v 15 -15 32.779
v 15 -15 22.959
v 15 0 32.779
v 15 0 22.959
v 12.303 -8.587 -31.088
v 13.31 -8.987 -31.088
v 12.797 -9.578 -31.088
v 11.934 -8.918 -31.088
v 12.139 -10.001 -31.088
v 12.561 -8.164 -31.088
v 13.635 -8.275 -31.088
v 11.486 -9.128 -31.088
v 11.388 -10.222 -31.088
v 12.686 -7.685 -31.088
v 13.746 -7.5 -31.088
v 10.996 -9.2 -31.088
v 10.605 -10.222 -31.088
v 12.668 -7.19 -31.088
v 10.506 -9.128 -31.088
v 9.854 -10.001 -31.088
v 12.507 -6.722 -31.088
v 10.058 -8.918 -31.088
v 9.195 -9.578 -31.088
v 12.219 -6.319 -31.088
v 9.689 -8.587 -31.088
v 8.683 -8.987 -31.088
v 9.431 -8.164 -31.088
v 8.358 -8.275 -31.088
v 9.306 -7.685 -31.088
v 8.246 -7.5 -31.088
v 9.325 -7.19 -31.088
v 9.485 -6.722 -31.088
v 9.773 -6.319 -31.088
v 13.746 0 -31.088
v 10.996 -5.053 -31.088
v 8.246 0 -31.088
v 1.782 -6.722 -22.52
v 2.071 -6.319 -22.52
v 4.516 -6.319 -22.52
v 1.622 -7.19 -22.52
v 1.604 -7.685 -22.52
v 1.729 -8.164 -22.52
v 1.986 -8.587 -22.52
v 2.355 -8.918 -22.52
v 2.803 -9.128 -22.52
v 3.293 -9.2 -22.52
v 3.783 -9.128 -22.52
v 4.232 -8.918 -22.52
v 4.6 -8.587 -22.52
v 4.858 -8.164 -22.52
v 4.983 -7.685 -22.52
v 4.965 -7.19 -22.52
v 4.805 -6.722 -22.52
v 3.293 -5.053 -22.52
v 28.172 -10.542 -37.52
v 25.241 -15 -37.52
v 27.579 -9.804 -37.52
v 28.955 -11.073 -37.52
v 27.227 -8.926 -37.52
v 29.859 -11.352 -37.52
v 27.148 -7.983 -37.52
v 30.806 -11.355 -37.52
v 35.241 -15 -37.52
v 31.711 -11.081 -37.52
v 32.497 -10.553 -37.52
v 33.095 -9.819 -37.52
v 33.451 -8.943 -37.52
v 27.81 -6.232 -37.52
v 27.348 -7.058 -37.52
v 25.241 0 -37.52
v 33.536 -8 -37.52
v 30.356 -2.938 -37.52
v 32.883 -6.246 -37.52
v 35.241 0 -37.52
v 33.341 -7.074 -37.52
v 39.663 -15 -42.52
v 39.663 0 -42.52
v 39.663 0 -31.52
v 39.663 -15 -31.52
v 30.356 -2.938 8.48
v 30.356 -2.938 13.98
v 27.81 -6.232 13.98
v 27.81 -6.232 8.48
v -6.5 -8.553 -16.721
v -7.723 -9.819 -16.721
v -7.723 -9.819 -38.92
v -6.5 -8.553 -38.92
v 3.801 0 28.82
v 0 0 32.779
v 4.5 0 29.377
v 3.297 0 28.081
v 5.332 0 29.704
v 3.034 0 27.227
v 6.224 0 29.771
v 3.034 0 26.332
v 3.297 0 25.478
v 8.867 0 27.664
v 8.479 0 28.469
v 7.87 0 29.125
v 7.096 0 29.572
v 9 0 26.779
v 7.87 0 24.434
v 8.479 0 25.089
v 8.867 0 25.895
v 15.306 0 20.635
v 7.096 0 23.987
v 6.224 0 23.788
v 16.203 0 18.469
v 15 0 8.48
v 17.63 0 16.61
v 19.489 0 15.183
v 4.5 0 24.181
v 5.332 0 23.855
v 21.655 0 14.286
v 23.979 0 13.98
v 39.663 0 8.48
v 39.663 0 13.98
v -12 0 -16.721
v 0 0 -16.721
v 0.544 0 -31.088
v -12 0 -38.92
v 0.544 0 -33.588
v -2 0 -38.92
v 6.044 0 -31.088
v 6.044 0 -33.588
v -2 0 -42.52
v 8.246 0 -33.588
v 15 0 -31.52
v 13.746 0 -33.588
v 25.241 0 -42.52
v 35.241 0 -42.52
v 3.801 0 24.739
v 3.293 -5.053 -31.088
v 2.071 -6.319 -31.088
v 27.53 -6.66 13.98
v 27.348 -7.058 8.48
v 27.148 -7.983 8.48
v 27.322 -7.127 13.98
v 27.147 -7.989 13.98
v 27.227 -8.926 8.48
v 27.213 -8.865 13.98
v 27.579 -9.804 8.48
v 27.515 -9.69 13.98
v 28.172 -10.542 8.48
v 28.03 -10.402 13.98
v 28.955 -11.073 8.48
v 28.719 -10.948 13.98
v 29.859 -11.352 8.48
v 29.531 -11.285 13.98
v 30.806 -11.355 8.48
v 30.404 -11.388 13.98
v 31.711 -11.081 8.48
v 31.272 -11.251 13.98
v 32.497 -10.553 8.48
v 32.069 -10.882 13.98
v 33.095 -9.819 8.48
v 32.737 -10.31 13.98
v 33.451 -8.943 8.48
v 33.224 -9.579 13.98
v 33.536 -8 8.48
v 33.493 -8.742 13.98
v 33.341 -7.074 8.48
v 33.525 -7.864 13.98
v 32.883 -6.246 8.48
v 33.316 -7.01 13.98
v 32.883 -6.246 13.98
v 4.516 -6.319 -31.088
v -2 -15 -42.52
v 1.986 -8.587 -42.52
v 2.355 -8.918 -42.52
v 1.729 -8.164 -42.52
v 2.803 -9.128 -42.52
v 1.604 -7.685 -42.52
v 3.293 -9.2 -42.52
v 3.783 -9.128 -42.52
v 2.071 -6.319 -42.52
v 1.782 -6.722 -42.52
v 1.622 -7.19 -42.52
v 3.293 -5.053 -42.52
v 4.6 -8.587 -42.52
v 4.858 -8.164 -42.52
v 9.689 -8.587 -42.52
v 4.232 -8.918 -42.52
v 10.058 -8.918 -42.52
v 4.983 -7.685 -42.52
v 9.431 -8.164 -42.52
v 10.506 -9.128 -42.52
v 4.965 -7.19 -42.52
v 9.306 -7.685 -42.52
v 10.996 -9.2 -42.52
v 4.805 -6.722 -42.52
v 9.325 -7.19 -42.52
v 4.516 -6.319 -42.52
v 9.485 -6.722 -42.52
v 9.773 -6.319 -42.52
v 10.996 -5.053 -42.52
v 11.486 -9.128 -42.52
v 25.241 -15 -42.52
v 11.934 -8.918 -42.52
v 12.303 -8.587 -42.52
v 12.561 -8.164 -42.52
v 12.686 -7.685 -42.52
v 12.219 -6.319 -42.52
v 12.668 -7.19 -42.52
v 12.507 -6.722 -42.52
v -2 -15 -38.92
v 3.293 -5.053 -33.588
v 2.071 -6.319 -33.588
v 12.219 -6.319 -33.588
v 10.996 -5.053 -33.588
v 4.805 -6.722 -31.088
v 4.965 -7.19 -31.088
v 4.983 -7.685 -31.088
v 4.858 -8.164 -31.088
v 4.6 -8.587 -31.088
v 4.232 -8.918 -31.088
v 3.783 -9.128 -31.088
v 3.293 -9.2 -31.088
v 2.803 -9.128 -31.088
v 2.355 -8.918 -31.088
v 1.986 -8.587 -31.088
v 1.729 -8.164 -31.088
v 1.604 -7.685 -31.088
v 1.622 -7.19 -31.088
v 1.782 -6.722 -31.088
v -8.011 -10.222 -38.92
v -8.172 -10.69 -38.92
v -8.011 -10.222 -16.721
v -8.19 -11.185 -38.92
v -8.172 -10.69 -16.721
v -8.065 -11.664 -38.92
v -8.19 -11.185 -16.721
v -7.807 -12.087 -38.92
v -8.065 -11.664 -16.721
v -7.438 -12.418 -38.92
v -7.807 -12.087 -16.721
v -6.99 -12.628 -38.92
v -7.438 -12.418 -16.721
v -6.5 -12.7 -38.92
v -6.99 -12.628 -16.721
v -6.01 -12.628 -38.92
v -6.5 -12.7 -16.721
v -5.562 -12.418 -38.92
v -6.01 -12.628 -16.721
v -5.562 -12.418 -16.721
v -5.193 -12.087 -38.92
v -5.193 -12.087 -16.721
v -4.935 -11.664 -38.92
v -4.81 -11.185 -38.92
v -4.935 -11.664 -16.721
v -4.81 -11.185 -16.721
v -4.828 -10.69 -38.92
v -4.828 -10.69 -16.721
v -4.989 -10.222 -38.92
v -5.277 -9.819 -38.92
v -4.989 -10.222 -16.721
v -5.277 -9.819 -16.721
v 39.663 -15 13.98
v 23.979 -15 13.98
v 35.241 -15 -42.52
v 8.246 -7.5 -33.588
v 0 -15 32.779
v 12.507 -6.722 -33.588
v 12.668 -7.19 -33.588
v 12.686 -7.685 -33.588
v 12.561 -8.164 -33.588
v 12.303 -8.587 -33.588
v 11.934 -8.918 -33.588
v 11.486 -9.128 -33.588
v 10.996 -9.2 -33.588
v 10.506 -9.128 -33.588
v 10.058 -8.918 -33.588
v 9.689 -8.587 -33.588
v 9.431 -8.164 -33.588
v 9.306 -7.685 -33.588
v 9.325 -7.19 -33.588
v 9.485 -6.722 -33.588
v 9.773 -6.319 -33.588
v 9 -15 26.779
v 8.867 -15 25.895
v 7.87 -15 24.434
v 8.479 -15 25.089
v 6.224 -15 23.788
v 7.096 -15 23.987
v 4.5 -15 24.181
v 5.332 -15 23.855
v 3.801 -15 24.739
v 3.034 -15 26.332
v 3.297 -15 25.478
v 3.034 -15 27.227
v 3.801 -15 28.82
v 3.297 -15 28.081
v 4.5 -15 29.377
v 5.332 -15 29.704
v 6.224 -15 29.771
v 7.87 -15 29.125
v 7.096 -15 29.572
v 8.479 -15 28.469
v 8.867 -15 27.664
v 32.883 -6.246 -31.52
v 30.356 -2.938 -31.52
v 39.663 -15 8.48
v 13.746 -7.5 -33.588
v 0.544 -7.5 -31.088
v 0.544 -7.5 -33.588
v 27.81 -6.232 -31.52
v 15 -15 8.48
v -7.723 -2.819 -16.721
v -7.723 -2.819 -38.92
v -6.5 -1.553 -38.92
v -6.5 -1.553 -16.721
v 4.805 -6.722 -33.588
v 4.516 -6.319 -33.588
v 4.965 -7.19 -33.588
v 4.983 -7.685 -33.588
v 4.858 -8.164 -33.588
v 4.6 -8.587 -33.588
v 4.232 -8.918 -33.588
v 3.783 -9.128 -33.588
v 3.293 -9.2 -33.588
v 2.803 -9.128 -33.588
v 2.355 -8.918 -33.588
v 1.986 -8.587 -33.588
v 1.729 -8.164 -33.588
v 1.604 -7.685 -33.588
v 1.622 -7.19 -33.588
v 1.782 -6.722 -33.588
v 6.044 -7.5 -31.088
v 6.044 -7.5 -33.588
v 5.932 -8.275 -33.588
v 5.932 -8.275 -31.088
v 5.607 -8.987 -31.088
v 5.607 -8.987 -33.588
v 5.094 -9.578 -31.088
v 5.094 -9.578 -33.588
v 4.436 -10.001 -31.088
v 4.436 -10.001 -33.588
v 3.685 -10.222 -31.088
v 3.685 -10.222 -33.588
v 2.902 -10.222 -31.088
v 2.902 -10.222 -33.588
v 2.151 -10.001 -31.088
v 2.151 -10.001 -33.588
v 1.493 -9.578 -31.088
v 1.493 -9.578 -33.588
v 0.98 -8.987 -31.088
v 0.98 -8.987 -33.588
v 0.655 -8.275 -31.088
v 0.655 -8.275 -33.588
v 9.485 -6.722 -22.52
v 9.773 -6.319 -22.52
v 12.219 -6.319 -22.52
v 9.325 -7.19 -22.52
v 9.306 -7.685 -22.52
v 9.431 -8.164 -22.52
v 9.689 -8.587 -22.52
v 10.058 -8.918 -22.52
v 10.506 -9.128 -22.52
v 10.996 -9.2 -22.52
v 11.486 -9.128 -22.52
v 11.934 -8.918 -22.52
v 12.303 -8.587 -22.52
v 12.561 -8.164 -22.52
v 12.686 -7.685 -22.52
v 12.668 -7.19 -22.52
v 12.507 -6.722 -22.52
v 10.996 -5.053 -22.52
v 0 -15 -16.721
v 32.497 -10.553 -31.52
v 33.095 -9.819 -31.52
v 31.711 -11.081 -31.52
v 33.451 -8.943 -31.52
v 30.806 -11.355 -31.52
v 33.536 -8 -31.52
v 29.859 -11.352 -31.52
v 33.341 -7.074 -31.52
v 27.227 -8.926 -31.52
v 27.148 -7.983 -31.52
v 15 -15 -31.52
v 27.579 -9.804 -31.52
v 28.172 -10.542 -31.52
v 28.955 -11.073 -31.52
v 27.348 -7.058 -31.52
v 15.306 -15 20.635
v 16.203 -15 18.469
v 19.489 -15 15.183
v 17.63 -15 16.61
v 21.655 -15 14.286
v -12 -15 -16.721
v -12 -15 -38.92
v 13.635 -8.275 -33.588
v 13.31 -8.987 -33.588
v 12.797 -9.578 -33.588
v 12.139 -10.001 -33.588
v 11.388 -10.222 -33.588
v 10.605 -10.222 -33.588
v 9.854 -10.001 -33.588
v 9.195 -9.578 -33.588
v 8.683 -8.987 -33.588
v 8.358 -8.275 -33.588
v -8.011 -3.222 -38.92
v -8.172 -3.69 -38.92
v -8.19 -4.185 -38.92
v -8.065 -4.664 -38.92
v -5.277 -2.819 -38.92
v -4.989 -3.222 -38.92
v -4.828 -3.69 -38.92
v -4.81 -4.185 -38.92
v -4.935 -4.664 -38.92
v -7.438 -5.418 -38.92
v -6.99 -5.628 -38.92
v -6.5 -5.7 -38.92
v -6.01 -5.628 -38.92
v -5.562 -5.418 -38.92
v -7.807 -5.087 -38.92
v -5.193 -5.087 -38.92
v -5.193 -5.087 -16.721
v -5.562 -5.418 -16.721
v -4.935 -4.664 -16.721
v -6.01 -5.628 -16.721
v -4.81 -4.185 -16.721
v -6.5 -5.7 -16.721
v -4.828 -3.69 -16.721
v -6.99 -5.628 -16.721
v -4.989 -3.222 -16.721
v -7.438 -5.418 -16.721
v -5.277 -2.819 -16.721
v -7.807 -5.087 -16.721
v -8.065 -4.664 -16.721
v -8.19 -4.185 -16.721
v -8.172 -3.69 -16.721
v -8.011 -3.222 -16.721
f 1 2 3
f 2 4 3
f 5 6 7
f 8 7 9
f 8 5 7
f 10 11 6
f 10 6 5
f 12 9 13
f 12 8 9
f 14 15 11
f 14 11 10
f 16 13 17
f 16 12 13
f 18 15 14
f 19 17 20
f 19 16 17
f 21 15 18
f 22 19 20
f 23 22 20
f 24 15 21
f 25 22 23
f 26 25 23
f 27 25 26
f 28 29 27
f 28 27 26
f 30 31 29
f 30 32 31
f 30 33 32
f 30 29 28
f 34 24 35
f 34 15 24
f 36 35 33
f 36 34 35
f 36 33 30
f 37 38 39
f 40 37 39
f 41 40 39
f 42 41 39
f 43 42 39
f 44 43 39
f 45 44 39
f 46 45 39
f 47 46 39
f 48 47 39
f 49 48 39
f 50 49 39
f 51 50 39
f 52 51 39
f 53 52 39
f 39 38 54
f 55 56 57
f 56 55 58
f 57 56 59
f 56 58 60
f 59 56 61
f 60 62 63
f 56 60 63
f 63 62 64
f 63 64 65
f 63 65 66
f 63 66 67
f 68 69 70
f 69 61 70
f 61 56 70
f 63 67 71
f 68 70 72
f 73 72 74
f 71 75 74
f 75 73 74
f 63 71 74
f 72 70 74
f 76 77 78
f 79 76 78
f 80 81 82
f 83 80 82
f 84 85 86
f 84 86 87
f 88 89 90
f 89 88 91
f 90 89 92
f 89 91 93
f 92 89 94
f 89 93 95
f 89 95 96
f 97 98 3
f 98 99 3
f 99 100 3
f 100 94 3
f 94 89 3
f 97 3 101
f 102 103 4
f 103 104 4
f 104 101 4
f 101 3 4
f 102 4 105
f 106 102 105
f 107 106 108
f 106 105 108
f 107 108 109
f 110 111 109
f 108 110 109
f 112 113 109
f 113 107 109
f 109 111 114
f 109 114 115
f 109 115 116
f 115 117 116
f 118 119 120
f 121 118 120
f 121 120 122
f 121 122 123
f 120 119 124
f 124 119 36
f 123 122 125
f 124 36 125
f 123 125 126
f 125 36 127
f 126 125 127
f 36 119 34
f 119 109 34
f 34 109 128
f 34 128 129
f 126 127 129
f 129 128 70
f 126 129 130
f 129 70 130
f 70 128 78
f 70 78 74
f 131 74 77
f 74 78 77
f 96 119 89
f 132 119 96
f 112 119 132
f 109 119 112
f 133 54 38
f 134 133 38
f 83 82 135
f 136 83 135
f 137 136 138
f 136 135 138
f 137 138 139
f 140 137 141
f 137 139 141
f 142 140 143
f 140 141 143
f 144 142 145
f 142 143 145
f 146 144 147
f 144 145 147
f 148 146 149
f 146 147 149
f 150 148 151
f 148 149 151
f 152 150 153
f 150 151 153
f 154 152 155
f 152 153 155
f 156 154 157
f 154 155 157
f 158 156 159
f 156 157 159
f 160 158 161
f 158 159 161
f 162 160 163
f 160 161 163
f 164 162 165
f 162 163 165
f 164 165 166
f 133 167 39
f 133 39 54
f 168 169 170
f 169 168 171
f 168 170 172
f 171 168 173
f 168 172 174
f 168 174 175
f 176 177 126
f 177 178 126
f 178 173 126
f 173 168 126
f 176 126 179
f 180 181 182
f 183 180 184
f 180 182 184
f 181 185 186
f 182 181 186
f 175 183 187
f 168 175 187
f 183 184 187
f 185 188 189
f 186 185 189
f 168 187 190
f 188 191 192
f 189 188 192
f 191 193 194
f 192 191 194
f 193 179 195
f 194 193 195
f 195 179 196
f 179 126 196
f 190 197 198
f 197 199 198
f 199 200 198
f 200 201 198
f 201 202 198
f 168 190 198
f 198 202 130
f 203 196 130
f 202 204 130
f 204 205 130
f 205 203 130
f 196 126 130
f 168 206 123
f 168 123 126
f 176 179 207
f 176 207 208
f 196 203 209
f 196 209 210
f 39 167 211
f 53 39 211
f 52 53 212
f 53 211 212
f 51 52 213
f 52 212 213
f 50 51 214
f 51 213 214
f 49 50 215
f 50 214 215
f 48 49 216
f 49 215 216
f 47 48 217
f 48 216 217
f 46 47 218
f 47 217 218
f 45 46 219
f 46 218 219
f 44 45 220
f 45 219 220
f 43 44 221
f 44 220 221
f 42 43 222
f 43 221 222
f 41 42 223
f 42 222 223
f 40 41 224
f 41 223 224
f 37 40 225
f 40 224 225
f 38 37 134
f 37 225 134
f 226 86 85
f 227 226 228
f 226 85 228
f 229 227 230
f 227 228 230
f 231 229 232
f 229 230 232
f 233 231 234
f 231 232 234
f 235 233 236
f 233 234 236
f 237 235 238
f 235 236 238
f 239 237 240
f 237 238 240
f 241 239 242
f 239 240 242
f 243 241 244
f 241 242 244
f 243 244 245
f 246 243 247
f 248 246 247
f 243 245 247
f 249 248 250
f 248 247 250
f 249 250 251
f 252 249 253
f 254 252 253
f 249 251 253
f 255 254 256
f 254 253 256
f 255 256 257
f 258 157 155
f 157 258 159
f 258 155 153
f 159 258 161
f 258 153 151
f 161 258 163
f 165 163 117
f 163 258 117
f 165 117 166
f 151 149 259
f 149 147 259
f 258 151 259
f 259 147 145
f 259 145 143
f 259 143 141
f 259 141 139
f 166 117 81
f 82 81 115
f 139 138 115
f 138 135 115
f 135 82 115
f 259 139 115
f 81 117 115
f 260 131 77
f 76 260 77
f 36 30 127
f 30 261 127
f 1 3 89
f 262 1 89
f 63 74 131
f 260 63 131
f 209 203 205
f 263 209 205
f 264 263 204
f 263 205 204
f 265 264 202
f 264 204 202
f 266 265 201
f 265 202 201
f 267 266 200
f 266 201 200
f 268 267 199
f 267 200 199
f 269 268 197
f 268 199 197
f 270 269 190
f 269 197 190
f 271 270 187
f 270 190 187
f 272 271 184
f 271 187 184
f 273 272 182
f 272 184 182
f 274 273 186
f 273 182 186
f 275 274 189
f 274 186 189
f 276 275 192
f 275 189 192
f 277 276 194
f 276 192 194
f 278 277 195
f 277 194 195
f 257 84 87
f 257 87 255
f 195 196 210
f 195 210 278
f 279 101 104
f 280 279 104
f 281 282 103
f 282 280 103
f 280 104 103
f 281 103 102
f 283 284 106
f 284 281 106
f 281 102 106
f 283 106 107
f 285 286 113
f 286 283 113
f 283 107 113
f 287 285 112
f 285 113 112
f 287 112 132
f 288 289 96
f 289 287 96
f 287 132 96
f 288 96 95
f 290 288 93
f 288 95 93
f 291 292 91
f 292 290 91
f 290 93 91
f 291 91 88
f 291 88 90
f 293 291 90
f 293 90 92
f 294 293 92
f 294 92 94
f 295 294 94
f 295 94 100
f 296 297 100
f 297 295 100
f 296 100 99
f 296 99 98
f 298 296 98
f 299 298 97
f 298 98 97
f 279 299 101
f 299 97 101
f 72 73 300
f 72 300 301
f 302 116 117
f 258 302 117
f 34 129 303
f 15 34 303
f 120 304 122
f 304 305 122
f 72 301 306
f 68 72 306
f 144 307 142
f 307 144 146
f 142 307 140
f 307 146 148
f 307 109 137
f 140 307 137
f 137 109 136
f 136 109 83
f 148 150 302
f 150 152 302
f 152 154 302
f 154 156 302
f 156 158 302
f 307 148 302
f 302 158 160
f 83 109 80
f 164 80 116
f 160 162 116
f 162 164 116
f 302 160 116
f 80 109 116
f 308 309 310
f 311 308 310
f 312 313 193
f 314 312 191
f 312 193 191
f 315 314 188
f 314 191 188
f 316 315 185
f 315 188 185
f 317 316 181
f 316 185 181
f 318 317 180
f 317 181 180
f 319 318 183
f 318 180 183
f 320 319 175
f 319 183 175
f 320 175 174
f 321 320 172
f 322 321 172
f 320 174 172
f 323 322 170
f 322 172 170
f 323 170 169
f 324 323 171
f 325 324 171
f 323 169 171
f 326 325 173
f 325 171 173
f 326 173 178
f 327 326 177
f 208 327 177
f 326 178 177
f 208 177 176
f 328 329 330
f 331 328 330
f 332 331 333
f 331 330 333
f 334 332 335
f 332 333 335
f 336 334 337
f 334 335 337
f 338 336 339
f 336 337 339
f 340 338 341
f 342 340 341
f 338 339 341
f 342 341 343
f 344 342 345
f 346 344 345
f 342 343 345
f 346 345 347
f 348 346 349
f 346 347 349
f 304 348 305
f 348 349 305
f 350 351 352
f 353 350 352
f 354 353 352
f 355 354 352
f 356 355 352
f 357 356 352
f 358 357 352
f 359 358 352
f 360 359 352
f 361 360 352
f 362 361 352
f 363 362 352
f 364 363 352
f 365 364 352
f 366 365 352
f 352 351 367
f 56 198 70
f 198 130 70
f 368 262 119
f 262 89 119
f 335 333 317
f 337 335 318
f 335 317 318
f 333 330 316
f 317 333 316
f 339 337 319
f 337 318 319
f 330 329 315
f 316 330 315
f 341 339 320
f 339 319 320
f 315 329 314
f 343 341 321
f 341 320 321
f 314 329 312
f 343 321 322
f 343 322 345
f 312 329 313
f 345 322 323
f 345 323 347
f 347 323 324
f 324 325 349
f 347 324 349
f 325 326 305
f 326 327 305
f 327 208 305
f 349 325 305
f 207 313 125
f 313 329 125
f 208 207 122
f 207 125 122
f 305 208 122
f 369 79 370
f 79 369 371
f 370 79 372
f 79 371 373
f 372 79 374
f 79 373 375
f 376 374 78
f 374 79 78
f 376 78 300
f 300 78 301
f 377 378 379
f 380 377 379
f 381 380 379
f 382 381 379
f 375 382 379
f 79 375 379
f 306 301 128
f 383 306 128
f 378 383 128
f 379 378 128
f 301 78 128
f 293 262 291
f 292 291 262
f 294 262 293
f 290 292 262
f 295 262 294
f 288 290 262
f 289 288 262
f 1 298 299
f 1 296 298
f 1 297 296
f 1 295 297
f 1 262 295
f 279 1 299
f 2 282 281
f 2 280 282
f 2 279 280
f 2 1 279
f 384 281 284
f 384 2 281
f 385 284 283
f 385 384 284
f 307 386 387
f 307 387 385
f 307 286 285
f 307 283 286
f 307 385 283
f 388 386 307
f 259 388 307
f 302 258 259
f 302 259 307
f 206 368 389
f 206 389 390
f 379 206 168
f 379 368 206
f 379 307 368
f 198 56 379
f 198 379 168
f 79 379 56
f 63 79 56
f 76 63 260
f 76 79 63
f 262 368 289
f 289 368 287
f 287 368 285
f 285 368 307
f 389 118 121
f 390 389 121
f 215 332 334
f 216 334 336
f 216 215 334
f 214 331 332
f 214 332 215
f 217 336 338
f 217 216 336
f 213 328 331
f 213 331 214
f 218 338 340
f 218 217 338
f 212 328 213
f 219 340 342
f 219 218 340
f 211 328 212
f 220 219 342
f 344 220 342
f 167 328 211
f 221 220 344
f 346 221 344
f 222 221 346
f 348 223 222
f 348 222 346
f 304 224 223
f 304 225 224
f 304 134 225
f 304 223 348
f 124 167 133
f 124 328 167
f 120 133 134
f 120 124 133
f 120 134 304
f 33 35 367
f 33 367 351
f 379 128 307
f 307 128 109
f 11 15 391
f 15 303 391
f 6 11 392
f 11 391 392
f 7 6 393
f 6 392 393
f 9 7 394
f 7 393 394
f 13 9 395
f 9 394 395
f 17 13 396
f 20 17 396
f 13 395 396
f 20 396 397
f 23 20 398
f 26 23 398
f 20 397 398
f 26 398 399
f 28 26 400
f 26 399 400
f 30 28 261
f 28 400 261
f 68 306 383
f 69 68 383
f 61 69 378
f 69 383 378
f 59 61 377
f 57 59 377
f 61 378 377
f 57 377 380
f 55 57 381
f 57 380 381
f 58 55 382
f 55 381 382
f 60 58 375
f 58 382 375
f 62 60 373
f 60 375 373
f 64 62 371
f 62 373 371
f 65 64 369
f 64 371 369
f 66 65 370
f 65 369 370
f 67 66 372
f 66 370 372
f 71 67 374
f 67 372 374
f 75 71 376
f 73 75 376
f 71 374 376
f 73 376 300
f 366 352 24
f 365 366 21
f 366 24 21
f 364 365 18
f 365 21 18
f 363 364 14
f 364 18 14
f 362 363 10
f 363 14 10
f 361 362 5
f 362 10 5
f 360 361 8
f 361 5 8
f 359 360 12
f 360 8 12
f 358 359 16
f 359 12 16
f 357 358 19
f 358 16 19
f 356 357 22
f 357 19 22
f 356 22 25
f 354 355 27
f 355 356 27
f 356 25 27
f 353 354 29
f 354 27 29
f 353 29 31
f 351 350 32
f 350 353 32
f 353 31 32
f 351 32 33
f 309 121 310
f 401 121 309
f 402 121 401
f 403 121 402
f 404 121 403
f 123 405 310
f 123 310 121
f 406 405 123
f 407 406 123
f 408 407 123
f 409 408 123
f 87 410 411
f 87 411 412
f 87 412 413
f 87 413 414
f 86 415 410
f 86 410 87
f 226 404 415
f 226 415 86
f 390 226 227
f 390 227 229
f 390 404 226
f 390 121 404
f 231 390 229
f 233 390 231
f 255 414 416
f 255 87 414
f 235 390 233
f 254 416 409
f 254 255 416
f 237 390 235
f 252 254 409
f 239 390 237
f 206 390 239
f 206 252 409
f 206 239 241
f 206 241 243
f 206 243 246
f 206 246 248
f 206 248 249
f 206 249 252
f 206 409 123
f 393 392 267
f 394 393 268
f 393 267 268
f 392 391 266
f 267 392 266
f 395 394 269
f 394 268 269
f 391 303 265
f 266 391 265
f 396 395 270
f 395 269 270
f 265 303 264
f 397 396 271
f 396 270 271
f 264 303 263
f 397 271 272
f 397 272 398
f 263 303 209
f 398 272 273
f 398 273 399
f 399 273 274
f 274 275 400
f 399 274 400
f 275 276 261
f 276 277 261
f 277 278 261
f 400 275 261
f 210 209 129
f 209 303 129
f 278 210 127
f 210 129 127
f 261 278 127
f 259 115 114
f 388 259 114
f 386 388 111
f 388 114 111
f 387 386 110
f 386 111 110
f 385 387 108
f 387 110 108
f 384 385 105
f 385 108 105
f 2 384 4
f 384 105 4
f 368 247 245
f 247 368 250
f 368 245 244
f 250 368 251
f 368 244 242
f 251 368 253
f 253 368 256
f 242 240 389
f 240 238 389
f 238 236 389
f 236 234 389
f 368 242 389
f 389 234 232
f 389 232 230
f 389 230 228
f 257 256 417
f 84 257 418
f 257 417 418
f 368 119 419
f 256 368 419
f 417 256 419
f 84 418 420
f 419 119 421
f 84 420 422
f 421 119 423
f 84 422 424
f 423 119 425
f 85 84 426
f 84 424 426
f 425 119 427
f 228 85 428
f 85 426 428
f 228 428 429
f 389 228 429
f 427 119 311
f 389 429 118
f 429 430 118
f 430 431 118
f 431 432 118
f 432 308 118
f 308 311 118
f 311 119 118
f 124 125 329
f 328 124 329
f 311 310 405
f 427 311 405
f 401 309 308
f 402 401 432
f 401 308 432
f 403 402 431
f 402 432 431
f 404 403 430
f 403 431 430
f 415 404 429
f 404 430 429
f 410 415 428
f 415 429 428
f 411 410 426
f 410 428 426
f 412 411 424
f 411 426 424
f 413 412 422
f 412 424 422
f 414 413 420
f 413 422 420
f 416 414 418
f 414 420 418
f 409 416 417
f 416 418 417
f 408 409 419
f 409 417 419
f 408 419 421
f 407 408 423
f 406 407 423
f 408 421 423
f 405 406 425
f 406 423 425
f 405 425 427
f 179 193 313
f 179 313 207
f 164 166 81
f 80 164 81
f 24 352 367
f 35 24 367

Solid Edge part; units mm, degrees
sketch "Sketch1" plane through (0, 0, 0) normal (0, -1, 0) x (1, 0, 0)
  line L0 (0, 32.7794) -> (0, -16.7206)
  line L1 (0, -16.7206) -> (-12, -16.7206)
  line L2 (-12, -16.7206) -> (-12, -42.5202)
  line L3 (-12, -42.5202) -> (39.6634, -42.5202)
  line L4 (39.6634, -42.5202) -> (39.6634, -31.5202)
  line L5 (39.6634, -31.5202) -> (15, -31.5202)
  line L6 (15, -31.5202) -> (15, 8.4798)
  line L7 (15, 8.4798) -> (39.6634, 8.4798)
  line L8 (39.6634, 8.4798) -> (39.6634, 13.9798)
  line L9 (39.6634, 13.9798) -> (23.9789, 13.9798)
  arc A0 (23.9789, 13.9798) -> (15, 22.9587) centre (23.9789, 22.9587) cw
  line L10 (15, 22.9587) -> (15, 32.7794)
  line L11 (15, 32.7794) -> (0, 32.7794)
  circle A1 centre (6, 26.7794) radius 3
  dimension "D1" = 6
  dimension "D2" = 15
  dimension "D3" = 6
  dimension "D4" = 6
  dimension "D5" = 12
  dimension "D6" = 11
  dimension "D7" = 25.7996
  dimension "D8" = 18.7996
  dimension "D9" = 40
  dimension "D10" = 5.5
extrude "Protrusion1" add sketch "Sketch1" along normal blind 15
sketch "Sketch2" plane through (12.5, -15, -0.5832) normal (0, -1, 0) x (0, 0, 1)
  line L0 (-38.337, 24.5) -> (-38.337, 14.5)
  line L1 (-38.337, 14.5) -> (-41.937, 14.5)
  line L2 (-41.937, 14.5) -> (-41.937, 24.5)
  line L3 (-41.937, 24.5) -> (-38.337, 24.5)
  dimension "D1" = 10
  dimension "D2" = 3.6
extrude "Cutout1" cut sketch "Sketch2" against normal through all
sketch "Sketch3" plane through (-6, -7.5, -16.7206) normal (0, 0, 1) x (1, 0, 0)
  line L0 (-1.7229, -2.3191) -> (-0.5, -1.0528)
  line L1 (-0.5, -1.0528) -> (0.7229, -2.3191)
  arc A0 (0.7229, -2.3191) -> (-1.7229, -2.3191) centre (-0.5, -3.5) cw
  line L2 (-1.7229, 4.6809) -> (-0.5, 5.9472)
  line L3 (-0.5, 5.9472) -> (0.7229, 4.6809)
  arc A1 (0.7229, 4.6809) -> (-1.7229, 4.6809) centre (-0.5, 3.5) cw
extrude "Cutout2" cut sketch "Sketch3" against normal through all
sketch "Sketch4" plane through (24.5, -7.5, 13.9798) normal (0, 0, 1) x (1, 0, 0)
  line L0 (8.3834, 1.2545) -> (5.8555, 4.5615)
  line L1 (5.8555, 4.5615) -> (3.3095, 1.2684)
  arc A0 (3.3095, 1.2684) -> (8.3834, 1.2545) centre (5.8411, -0.6889) ccw
extrude "Cutout3" cut sketch "Sketch4" against normal through all
sketch "Sketch5" plane through (15.5, 0, -7.0884) normal (0, 1, 0) x (-1, 0, 0)
  line L0 (-19.7411, -39.4958) -> (-9.7411, -39.4958)
  line L1 (-9.7411, -39.4958) -> (-9.7411, -30.4318)
  line L2 (-9.7411, -30.4318) -> (-19.7411, -30.4318)
  line L3 (-19.7411, -30.4318) -> (-19.7411, -39.4958)
  dimension "D1" = 10
  dimension "D2" = 5
  dimension "D3" = 1.7
extrude "Cutout4" cut sketch "Sketch5" against normal through all
sketch "Sketch6" plane through (10.293, -7.5, -42.5202) normal (0, 0, -1) x (0, 1, 0)
  line L0 (1.1809, -5.7767) -> (2.4472, -6.9996)
  line L1 (2.4472, -6.9996) -> (1.1809, -8.2225)
  arc A0 (1.1809, -8.2225) -> (1.1809, -5.7767) centre (0, -6.9996) cw
  line L2 (1.1809, 1.926) -> (2.4472, 0.7031)
  line L3 (2.4472, 0.7031) -> (1.1809, -0.5197)
  arc A1 (1.1809, -0.5197) -> (1.1809, 1.926) centre (0, 0.7031) cw
extrude "ExtrudedCutout_5" cut sketch "Sketch6" against normal blind 20
sketch "Sketch7" plane through (0, 0, -33.5884) normal (0, 0, 1) x (1, 0, 0)
  line L0 (8.2462, -7.5) -> (8.2462, 0)
  line L1 (13.7462, 0) -> (8.2462, 0)
  line L2 (13.7462, 0) -> (13.7462, -7.5)
  arc A0 (13.7462, -7.5) -> (8.2462, -7.5) centre (10.9962, -7.5) cw
  line L3 (6.0435, 0) -> (6.0435, -7.5)
  arc A1 (6.0435, -7.5) -> (0.5435, -7.5) centre (3.2935, -7.5) cw
  line L4 (0.5435, -7.5) -> (0.5435, 0)
  line L5 (6.0435, 0) -> (0.5435, 0)
extrude "ExtrudedCutout_8" cut sketch "Sketch7" along normal blind 2.5
properties material "Steel"
